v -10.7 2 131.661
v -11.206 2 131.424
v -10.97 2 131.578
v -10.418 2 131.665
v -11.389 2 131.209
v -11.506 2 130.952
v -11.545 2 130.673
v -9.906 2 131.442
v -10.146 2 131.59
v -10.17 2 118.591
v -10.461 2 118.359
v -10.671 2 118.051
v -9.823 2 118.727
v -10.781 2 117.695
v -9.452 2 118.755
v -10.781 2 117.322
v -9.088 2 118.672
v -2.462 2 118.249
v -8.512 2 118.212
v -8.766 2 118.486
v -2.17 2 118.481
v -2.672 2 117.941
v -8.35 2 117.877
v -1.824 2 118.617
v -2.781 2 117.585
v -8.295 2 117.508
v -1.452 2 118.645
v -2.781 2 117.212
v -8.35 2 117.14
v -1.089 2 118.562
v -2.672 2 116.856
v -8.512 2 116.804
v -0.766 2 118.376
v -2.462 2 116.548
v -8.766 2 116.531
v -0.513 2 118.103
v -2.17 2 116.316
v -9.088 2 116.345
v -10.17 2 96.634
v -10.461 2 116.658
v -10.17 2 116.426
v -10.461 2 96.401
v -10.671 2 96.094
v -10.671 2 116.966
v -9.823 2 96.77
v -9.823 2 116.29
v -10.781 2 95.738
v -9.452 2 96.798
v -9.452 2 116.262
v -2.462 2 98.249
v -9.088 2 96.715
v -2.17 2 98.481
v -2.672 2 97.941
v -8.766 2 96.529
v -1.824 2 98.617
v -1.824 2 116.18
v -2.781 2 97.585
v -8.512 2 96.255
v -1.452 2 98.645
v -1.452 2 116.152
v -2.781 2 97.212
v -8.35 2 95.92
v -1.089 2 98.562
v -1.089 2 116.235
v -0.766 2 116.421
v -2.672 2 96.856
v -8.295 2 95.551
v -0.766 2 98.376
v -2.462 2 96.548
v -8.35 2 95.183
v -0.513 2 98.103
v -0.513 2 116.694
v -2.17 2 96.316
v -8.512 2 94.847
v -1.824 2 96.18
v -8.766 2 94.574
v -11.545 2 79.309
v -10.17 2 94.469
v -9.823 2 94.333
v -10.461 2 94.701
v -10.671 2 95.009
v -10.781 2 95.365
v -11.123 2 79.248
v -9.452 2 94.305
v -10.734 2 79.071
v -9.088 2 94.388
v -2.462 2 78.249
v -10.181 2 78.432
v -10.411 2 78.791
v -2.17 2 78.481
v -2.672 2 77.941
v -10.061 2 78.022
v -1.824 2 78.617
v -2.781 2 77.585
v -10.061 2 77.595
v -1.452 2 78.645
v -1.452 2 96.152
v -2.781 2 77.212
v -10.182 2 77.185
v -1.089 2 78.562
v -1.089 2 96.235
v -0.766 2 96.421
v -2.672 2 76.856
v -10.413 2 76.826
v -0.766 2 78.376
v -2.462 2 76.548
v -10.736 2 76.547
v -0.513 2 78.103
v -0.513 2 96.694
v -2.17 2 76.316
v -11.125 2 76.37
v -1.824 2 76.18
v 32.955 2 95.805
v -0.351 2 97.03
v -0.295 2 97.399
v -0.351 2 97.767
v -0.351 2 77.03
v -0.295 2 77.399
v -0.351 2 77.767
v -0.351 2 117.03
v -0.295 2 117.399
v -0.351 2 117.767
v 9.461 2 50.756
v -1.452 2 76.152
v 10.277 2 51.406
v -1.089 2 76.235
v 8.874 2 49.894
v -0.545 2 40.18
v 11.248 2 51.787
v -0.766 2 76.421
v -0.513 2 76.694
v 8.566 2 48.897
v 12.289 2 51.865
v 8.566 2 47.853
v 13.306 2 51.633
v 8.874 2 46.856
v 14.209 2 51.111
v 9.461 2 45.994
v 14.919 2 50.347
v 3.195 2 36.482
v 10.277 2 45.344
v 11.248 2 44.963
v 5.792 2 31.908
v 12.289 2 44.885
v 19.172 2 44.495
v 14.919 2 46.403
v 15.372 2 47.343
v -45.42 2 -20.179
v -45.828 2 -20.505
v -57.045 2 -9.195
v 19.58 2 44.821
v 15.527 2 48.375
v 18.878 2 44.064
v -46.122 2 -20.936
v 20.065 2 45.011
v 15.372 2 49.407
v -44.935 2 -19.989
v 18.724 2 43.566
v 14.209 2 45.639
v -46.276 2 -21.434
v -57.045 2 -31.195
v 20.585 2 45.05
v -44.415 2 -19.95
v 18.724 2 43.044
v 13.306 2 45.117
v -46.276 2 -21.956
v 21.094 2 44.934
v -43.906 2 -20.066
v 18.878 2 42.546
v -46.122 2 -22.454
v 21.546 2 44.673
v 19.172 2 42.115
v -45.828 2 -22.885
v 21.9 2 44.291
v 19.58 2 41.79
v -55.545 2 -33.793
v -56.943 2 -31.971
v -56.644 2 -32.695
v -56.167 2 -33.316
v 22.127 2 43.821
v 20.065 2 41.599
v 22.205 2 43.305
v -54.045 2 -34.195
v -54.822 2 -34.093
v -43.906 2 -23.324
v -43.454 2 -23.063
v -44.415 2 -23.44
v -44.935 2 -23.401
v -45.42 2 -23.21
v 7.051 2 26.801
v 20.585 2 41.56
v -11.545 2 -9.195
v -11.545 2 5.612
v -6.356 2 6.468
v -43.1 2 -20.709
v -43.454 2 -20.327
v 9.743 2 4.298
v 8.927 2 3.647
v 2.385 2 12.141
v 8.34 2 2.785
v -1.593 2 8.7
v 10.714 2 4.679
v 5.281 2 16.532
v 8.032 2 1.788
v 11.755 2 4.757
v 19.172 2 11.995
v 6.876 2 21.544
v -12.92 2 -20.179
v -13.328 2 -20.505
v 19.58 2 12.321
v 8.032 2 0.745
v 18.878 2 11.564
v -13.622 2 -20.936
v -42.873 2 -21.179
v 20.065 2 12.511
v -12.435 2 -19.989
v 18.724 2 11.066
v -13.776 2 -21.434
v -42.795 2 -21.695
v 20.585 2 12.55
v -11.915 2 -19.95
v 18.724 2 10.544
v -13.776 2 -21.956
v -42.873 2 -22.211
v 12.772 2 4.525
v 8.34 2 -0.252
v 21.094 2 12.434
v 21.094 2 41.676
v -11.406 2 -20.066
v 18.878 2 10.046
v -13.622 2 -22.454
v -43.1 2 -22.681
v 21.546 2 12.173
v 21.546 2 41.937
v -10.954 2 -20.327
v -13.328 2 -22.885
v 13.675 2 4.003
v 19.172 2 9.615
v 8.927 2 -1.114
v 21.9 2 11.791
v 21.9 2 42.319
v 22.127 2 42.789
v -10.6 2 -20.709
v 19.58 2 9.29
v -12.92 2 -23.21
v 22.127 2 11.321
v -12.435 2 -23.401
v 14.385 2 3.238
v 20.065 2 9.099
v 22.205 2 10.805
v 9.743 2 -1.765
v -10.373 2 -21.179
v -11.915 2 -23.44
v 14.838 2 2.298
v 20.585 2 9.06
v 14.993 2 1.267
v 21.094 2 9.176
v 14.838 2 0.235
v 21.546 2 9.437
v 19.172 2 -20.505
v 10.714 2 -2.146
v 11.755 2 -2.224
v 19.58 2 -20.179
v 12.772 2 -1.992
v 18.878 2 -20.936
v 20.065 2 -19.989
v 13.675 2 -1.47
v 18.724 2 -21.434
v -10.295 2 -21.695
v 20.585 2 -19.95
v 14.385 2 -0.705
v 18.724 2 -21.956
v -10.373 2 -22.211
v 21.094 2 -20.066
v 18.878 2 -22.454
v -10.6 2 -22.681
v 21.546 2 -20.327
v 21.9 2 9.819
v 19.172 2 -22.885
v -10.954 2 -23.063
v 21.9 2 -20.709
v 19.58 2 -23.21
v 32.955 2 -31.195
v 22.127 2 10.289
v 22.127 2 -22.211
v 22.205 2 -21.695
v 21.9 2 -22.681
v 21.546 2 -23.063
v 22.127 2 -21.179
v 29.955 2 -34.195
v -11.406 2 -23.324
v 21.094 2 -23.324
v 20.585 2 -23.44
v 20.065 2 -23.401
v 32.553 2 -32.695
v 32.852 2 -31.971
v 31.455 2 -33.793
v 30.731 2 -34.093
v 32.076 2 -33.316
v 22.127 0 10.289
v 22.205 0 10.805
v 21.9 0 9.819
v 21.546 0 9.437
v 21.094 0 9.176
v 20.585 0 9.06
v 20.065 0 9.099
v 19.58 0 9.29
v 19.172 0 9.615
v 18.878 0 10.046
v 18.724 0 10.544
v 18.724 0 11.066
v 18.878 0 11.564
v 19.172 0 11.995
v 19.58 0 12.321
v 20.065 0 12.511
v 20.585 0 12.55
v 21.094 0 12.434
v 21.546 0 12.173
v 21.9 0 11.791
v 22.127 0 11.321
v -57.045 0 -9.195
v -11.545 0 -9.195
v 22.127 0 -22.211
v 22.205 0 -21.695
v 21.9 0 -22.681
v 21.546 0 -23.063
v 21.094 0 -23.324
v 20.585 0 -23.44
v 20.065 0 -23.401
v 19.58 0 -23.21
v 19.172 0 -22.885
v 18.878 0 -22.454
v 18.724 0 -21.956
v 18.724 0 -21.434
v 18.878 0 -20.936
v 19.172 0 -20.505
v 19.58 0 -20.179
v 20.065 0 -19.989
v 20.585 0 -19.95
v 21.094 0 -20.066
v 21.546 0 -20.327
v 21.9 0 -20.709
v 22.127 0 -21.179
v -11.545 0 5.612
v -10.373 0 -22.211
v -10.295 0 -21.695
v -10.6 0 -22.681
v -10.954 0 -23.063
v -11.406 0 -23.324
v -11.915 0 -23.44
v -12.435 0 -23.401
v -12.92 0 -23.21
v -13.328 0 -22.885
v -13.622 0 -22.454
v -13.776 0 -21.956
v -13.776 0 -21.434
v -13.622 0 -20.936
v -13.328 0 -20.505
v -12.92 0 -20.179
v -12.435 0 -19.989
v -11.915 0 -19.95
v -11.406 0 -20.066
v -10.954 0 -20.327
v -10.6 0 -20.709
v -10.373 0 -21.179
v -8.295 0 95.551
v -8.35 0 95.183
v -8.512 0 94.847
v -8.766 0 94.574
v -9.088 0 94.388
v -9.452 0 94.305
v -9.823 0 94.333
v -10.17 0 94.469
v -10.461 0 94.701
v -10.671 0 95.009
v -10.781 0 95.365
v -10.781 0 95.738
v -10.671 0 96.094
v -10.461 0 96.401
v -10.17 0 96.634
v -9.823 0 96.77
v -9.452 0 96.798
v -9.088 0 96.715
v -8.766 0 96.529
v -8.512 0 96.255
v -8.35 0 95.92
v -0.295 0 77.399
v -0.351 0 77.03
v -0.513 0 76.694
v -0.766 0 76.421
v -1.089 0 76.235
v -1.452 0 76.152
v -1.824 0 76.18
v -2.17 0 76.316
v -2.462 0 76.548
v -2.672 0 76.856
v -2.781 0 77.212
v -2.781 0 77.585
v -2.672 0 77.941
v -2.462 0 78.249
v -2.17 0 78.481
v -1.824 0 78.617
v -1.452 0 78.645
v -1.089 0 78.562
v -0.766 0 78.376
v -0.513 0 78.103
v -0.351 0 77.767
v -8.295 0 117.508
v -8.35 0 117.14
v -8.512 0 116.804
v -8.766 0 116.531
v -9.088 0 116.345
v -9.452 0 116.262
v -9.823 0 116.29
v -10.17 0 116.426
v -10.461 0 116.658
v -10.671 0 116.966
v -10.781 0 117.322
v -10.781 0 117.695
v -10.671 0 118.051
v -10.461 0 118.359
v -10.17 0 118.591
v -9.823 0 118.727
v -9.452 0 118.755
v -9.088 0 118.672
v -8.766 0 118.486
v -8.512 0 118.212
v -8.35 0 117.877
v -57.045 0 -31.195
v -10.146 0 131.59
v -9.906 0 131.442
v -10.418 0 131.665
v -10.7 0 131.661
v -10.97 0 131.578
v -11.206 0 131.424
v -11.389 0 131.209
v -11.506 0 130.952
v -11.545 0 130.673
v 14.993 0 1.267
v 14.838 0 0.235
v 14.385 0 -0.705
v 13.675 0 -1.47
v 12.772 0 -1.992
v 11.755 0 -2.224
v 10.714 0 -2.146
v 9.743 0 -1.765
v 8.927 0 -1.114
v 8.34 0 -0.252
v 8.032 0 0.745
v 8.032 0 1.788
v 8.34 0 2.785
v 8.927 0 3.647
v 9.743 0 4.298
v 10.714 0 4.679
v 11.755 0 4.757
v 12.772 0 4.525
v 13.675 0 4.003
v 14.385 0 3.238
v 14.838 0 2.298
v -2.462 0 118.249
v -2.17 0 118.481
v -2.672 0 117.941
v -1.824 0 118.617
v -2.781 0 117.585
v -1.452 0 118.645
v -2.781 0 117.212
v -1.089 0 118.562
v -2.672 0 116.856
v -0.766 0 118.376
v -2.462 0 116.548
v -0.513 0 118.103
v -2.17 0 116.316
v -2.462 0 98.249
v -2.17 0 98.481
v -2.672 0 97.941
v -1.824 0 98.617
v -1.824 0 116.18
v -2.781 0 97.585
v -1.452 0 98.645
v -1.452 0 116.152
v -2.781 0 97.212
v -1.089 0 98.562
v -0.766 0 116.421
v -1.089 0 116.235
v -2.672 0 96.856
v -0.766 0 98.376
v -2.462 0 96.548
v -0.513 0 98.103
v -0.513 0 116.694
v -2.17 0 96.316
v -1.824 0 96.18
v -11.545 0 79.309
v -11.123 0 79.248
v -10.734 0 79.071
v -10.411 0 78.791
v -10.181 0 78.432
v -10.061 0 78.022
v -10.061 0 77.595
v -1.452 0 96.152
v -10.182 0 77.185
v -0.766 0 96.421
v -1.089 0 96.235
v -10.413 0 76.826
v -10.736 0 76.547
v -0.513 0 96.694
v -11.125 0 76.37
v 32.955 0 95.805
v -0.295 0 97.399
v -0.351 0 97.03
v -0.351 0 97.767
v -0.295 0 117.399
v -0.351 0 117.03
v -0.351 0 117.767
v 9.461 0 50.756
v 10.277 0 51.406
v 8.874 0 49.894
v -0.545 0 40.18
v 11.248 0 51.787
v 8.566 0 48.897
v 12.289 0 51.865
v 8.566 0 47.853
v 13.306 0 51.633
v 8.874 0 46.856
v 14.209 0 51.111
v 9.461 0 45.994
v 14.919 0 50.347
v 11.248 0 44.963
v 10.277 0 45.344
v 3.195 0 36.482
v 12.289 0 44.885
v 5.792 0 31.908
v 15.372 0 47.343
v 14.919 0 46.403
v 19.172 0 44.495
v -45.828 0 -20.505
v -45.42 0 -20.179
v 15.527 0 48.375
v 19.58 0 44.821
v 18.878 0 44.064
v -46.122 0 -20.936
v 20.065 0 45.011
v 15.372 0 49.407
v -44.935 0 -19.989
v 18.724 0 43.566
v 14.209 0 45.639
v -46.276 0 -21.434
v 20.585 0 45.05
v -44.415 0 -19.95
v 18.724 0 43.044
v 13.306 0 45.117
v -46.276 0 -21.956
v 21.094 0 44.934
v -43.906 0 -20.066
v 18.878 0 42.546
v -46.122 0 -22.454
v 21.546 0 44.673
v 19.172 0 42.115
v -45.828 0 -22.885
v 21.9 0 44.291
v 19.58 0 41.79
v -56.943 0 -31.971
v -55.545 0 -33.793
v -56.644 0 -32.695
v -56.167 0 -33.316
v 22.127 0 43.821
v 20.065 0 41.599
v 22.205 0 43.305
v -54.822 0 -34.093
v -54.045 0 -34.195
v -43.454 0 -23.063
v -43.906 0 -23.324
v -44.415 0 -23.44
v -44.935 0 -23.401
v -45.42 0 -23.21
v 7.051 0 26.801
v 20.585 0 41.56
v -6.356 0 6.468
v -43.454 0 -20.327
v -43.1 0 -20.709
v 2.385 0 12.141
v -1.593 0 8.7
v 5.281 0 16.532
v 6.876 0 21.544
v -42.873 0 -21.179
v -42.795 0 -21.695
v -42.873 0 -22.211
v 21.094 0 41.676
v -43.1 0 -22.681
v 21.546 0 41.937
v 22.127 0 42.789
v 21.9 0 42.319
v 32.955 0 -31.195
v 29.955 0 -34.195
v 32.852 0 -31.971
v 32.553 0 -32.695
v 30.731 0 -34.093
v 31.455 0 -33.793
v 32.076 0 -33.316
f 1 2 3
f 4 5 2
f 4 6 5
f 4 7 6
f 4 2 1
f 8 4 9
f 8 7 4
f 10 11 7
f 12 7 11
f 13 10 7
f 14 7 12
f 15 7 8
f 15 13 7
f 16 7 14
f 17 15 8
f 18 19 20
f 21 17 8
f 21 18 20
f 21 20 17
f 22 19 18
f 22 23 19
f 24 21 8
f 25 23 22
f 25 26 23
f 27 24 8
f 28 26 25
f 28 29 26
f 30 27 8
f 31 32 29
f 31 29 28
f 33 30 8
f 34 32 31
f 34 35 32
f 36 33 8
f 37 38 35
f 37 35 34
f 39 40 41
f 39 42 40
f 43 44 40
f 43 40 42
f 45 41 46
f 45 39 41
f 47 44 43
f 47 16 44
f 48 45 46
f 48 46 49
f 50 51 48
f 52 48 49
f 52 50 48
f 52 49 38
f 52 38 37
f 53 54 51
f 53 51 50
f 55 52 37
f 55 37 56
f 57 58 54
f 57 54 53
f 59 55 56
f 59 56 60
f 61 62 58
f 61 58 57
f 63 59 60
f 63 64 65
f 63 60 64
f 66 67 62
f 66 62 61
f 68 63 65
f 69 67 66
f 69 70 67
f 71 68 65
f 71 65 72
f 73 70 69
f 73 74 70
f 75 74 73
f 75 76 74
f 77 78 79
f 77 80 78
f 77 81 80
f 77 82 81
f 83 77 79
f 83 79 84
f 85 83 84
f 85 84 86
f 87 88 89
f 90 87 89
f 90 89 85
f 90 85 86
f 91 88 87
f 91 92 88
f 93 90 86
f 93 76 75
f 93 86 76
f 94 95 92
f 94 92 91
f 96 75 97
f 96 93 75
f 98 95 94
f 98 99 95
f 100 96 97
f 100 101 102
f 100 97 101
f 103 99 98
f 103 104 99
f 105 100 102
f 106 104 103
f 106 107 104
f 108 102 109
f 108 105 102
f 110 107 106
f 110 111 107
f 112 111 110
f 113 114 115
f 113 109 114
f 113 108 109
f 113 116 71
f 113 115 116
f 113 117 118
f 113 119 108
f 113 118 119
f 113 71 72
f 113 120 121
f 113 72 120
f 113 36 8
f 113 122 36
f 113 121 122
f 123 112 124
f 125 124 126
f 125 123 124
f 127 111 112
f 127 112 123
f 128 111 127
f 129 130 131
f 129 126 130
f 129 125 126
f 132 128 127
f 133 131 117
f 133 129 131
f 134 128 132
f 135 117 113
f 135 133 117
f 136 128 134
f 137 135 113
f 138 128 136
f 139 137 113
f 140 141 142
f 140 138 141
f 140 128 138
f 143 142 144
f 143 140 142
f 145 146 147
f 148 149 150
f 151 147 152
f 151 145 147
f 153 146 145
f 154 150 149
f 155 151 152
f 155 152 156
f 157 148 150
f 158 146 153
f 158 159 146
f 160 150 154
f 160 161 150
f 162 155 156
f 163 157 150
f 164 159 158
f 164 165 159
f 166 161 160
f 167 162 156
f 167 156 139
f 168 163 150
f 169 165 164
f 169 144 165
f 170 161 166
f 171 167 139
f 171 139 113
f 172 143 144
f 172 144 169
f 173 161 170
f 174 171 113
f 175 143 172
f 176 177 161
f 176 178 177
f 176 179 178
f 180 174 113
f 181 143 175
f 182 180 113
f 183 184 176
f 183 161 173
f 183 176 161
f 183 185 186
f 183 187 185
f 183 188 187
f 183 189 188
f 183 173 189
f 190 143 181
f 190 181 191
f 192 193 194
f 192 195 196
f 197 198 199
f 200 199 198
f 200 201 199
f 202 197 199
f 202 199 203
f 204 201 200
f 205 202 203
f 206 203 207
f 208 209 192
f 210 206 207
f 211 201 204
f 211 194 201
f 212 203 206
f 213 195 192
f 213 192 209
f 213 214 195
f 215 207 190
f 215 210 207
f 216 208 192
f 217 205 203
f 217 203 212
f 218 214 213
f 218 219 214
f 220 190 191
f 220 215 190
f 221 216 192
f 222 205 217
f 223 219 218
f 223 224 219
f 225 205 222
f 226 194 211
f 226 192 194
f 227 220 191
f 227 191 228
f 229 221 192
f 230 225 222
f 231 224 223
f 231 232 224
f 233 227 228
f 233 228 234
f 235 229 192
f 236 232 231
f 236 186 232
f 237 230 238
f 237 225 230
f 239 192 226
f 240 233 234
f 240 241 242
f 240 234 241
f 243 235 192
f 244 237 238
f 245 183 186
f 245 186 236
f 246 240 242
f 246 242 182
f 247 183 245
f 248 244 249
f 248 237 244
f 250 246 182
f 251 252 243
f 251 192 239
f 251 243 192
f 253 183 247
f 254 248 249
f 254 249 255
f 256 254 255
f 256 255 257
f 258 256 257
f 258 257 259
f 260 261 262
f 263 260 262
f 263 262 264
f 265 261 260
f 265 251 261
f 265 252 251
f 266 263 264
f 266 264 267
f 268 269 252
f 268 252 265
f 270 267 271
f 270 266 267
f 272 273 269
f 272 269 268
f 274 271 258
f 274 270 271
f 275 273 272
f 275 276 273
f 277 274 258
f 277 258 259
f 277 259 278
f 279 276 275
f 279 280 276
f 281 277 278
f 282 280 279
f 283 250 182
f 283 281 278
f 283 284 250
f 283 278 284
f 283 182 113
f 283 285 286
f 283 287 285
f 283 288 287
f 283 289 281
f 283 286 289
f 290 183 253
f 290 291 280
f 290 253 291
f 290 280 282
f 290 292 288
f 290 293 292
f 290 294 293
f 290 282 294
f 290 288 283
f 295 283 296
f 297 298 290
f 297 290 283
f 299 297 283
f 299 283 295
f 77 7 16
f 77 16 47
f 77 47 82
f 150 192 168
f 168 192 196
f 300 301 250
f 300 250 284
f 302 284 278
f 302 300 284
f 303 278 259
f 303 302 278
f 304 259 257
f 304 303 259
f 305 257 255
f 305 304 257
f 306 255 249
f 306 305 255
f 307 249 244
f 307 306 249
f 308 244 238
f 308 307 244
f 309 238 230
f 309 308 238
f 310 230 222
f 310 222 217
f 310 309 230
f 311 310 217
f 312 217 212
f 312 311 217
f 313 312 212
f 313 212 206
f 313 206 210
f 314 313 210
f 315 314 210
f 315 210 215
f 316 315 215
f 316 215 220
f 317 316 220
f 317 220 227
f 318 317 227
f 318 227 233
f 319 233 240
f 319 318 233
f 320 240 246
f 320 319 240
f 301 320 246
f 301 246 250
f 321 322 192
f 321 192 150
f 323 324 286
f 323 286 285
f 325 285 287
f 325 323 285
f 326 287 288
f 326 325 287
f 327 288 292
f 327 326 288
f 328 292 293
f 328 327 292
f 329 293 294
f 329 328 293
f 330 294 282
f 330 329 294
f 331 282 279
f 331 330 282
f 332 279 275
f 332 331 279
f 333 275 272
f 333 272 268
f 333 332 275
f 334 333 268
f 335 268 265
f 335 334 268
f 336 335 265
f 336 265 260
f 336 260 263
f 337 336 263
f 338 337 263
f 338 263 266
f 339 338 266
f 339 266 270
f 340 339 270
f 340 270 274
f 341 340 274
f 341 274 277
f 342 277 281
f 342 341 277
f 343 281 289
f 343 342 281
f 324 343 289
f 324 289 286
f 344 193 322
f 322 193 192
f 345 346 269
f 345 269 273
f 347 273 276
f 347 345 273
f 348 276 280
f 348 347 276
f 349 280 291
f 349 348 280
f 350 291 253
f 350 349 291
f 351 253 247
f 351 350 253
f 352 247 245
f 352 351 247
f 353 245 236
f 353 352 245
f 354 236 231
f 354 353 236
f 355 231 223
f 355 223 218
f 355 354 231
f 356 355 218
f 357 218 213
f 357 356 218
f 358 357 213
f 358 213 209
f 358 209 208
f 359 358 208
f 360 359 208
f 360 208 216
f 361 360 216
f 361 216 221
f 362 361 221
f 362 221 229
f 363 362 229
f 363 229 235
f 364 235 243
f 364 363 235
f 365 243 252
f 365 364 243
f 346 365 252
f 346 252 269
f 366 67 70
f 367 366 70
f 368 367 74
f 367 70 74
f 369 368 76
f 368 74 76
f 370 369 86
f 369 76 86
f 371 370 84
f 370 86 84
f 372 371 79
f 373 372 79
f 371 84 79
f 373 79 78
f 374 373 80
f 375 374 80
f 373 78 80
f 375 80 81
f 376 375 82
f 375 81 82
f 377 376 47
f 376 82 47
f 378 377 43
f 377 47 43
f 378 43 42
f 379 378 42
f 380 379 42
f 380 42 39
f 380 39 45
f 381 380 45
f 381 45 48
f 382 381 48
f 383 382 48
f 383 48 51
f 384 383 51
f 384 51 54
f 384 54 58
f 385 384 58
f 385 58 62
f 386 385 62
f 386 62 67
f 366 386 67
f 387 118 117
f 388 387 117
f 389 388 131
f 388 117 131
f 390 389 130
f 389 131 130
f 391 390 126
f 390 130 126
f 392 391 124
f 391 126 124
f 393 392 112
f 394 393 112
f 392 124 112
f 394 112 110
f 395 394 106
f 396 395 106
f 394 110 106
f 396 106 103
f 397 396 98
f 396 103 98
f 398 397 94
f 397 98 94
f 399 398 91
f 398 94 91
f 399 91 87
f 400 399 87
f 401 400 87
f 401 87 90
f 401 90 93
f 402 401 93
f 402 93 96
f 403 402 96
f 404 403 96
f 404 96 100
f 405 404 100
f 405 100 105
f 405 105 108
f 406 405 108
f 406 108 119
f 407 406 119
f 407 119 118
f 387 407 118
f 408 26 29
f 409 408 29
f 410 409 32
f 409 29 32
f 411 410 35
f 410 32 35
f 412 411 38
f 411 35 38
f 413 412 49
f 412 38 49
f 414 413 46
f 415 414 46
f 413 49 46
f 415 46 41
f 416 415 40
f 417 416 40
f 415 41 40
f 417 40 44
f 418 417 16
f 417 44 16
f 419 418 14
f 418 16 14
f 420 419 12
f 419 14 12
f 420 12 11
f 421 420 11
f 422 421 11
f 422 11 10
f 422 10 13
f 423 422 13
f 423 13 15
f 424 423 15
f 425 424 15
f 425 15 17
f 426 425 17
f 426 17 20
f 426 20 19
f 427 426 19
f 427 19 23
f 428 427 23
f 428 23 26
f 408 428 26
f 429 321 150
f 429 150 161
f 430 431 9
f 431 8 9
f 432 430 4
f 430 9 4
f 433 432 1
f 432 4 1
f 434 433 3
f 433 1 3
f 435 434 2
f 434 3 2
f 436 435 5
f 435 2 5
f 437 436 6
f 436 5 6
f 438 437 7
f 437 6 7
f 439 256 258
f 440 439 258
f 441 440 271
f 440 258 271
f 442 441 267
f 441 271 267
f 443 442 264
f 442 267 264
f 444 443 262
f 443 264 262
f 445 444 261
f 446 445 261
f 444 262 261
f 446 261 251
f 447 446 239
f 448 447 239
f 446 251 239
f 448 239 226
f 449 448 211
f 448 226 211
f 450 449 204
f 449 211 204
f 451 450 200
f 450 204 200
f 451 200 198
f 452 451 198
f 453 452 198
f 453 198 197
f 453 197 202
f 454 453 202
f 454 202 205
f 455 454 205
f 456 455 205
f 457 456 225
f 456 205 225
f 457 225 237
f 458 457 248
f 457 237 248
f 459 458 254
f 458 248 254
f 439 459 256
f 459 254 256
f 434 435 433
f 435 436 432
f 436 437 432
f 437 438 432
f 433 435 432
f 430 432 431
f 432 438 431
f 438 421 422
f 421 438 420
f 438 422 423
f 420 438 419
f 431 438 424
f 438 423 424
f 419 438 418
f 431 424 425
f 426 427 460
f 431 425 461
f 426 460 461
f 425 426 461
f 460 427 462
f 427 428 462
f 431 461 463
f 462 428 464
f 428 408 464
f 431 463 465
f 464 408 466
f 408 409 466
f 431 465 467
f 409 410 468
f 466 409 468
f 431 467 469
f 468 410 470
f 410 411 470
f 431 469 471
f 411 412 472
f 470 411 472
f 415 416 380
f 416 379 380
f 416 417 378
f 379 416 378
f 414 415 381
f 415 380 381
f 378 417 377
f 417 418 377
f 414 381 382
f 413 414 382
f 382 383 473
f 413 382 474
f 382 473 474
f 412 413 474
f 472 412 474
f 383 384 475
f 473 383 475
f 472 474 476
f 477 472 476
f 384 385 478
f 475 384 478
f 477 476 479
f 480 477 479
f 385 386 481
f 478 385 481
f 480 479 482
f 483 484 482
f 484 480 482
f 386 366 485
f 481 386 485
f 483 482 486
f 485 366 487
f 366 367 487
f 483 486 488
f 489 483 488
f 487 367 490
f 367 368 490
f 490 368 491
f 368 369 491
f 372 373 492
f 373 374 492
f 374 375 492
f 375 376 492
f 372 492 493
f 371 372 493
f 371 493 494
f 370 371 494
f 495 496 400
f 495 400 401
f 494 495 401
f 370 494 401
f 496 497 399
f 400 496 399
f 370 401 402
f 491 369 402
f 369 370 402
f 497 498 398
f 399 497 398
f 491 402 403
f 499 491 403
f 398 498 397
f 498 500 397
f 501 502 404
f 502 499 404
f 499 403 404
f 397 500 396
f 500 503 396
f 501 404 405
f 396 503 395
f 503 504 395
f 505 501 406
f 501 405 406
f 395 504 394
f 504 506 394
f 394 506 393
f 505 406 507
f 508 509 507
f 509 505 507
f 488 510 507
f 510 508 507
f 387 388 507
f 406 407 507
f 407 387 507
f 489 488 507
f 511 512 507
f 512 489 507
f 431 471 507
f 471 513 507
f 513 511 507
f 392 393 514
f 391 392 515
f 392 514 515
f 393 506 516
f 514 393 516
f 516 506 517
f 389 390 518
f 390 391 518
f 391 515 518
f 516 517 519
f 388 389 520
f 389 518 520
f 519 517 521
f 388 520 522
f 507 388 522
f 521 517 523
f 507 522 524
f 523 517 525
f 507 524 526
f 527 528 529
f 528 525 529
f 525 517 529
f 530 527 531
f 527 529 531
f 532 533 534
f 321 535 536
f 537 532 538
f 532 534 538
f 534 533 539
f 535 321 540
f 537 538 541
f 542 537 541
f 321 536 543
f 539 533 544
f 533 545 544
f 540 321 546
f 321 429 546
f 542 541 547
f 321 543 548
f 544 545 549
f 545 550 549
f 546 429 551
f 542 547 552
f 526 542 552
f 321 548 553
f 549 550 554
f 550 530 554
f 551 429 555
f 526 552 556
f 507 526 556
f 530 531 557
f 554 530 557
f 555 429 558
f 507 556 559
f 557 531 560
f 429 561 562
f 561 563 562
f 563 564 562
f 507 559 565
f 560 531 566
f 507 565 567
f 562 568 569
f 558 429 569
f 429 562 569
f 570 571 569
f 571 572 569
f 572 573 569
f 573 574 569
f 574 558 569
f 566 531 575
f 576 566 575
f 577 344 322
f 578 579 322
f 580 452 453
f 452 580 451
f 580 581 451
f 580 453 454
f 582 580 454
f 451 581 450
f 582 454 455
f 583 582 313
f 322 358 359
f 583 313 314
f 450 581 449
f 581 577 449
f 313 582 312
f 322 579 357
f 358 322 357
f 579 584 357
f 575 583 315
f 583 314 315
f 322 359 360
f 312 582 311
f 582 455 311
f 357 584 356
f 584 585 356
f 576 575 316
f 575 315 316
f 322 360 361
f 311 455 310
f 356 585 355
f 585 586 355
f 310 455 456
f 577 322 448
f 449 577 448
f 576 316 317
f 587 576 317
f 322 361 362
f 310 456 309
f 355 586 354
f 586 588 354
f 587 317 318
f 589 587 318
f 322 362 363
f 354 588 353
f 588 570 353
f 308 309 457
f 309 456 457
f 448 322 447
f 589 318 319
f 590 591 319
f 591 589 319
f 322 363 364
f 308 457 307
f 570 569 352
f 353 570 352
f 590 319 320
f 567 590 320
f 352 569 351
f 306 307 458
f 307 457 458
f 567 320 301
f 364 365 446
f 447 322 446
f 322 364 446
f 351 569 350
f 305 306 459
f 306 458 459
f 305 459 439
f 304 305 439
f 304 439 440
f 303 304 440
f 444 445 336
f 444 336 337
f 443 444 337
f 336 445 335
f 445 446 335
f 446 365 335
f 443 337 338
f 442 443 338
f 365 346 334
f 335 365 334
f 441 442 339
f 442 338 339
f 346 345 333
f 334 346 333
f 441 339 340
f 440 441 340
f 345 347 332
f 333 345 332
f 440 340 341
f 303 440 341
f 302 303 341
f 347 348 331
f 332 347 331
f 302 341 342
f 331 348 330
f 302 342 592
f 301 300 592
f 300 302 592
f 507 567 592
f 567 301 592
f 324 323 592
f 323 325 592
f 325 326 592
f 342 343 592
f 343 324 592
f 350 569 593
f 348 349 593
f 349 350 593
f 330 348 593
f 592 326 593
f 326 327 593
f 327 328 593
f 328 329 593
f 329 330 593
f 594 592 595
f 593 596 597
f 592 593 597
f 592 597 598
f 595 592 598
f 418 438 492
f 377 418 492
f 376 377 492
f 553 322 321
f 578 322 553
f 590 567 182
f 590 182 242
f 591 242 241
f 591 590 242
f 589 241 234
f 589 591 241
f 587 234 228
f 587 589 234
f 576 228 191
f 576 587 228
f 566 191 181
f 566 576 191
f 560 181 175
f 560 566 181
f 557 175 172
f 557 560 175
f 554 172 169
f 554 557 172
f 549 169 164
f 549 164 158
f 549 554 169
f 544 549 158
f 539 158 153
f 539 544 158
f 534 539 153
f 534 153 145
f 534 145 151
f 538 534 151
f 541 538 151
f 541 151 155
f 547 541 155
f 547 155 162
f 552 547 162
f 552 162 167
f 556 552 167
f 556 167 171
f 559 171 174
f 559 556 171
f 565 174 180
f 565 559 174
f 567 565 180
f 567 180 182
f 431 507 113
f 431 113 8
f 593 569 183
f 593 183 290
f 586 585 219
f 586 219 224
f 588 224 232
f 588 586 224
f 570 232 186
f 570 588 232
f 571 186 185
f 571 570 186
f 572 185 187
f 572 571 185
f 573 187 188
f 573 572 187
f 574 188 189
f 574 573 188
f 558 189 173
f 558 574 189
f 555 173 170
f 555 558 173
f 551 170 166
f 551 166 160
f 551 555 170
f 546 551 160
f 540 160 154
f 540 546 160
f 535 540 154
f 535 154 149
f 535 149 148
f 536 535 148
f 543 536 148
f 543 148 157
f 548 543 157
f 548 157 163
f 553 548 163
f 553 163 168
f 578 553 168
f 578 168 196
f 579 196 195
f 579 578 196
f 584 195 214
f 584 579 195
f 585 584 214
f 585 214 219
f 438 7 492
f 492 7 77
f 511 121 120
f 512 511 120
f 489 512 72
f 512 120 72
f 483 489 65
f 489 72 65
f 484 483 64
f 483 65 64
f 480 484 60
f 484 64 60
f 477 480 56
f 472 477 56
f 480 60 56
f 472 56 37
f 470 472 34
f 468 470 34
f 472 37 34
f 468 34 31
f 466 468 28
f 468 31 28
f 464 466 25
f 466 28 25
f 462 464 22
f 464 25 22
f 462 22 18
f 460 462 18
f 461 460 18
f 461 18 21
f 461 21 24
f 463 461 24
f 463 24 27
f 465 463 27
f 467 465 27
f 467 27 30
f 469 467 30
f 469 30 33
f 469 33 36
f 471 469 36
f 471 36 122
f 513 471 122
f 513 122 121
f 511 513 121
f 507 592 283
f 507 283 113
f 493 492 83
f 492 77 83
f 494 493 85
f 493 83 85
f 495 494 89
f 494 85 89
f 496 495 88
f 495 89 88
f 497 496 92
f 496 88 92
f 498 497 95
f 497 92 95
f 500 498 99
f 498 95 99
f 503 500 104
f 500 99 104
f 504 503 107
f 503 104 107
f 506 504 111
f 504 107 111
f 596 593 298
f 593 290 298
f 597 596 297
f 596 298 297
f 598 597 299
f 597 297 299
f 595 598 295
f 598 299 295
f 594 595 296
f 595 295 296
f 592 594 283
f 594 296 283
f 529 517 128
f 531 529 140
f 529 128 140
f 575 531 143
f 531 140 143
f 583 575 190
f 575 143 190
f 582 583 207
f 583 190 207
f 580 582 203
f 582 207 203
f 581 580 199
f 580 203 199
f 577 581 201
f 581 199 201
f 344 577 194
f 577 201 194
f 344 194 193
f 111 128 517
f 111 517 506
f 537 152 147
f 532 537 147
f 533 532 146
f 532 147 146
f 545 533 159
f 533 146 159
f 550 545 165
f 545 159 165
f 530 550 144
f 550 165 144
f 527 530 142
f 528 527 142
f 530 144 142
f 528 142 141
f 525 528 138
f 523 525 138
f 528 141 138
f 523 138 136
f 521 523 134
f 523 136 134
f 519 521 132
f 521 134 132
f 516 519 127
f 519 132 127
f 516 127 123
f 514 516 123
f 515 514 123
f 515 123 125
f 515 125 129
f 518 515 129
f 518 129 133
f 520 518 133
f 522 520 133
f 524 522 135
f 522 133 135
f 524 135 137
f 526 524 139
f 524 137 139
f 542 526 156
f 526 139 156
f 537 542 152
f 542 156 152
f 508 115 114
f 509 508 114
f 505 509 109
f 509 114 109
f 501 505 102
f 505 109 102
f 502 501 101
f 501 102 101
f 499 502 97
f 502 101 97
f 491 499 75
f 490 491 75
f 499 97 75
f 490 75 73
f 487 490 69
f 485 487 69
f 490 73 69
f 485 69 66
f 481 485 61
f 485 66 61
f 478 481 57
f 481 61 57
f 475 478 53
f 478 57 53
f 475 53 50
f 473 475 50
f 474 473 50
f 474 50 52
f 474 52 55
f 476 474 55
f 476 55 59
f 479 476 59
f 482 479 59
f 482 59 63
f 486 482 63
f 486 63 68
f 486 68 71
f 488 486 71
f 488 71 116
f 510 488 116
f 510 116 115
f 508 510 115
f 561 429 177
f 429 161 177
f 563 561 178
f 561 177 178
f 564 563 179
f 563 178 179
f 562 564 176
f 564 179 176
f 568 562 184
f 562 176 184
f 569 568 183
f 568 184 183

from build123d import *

# Parameters (mm, degrees)
SKETCH_1_R               = 1.75
EXTRUDE_1_DEPTH          = 2
SKETCH_4_W               = 29
SKETCH_4_H               = 65
SKETCH_4_R               = 3.5
EXTRUDE_2_DEPTH          = 2
SKETCH_5_R               = 19.2
CUT_EXTRUDE_1_DEPTH      = 1
CUT_EXTRUDE_1_DEPTH_BACK = 3
CUT_EXTRUDE_2_DEPTH      = 1
CUT_EXTRUDE_2_DEPTH_BACK = 3
FILLET_1_R               = 3
SKETCH_9_R               = 1.5
CUT_EXTRUDE_4_DEPTH      = 1
CUT_EXTRUDE_4_DEPTH_BACK = 3
FILLET_2_R               = 1
SKETCH_13_R              = 1.25
CUT_EXTRUDE_6_DEPTH      = 1
CUT_EXTRUDE_6_DEPTH_BACK = 3
SKETCH_15_R              = 1.25
CUT_EXTRUDE_7_DEPTH      = 1
CUT_EXTRUDE_7_DEPTH_BACK = 3


with BuildPart() as part:
    # Эскиз1 → Бобышка-Вытянуть1 (new body)
    with BuildSketch(Plane(origin=(0, 0, 0), x_dir=(1, 0, 0), z_dir=(0, 1, 0))):
        Polygon((-57.045428332, 34.194915254), (32.954571668, 34.194915254), (32.954571668, -95.805084746), (-11.545428332, -132.805084746), (-11.545428332, -55.805084746), (17.454571668, -55.805084746), (17.454571668, 9.194915254), (-57.045428332, 9.194915254), align=None)
        with Locations((-44.545428332, 21.694915254)):
            Circle(SKETCH_1_R, mode=Mode.SUBTRACT)
        with Locations((-12.045428332, 21.694915254)):
            Circle(SKETCH_1_R, mode=Mode.SUBTRACT)
        with Locations((20.454571668, 21.694915254)):
            Circle(SKETCH_1_R, mode=Mode.SUBTRACT)
        with Locations((20.454571668, -10.805084746)):
            Circle(SKETCH_1_R, mode=Mode.SUBTRACT)
        with Locations((20.454571668, -43.305084746)):
            Circle(SKETCH_1_R, mode=Mode.SUBTRACT)
    extrude(amount=EXTRUDE_1_DEPTH)

    # Эскиз4 → Бобышка-Вытянуть2 (add)
    with BuildSketch(Plane(origin=(0, 2, 0), x_dir=(1, 0, 0), z_dir=(0, 1, 0))):
        with Locations((2.954571668, -23.305084746)):
            Rectangle(SKETCH_4_W, SKETCH_4_H)
        with Locations((12.027100485, -48.375084746)):
            Circle(SKETCH_4_R, mode=Mode.SUBTRACT)
        with Locations((11.493153901, -1.266502513)):
            Circle(SKETCH_4_R, mode=Mode.SUBTRACT)
    extrude(amount=-EXTRUDE_2_DEPTH)

    # Эскиз5 → Вырез-Вытянуть1 (cut, two sides)
    with BuildSketch(Plane(origin=(0, 2, 0), x_dir=(1, 0, 0), z_dir=(0, 1, 0))) as cut_extrude_1_sk:
        with Locations((-12.045428332, -24.805084746)):
            Circle(SKETCH_5_R)
    extrude(amount=CUT_EXTRUDE_1_DEPTH, mode=Mode.SUBTRACT)
    extrude(cut_extrude_1_sk.sketch, amount=-CUT_EXTRUDE_1_DEPTH_BACK, mode=Mode.SUBTRACT)

    # Эскиз7 → Вырез-Вытянуть2 (cut, two sides)
    with BuildSketch(Plane(origin=(0, 2, 0), x_dir=(1, 0, 0), z_dir=(0, 1, 0))) as cut_extrude_2_sk:
        with BuildLine():
            Line((-0.545428332, -40.180064421), (-11.545428332, -77.80926144))
            Line((-11.545428332, -77.80926144), (-11.545428332, -43.998573225))
            ThreePointArc((-11.545428332, -43.998573225), (-5.751853603, -42.935021213), (-0.545428332, -40.180064421))
        make_face()
    extrude(amount=CUT_EXTRUDE_2_DEPTH, mode=Mode.SUBTRACT)
    extrude(cut_extrude_2_sk.sketch, amount=-CUT_EXTRUDE_2_DEPTH_BACK, mode=Mode.SUBTRACT)

    # Скругление1
    fillet_1_edges = [part.edges().sort_by_distance(p)[0] for p in [
        (-57.045428332, 1, -34.194915254),
        (32.954571668, 1, -34.194915254),
    ]]
    fillet(fillet_1_edges, radius=FILLET_1_R)

    # Эскиз9 → Вырез-Вытянуть4 (cut, two sides)
    with BuildSketch(Plane(origin=(0, 2, 0), x_dir=(1, 0, 0), z_dir=(0, 1, 0))) as cut_extrude_4_sk:
        with Locations((-11.545428332, -77.80926144)):
            Circle(SKETCH_9_R)
    extrude(amount=CUT_EXTRUDE_4_DEPTH, mode=Mode.SUBTRACT)
    extrude(cut_extrude_4_sk.sketch, amount=-CUT_EXTRUDE_4_DEPTH_BACK, mode=Mode.SUBTRACT)

    # Скругление2
    fillet_2_edges = [part.edges().sort_by_distance(p)[0] for p in [
        (-11.545428332, 1, 132.805084746),
    ]]
    fillet(fillet_2_edges, radius=FILLET_2_R)

    # Эскиз13 → Вырез-Вытянуть6 (cut, two sides)
    with BuildSketch(Plane(origin=(0, 2, 0), x_dir=(1, 0, 0), z_dir=(0, 1, 0))) as cut_extrude_6_sk:
        with Locations((-9.54492596, -95.551225642)):
            Circle(SKETCH_13_R)
        with Locations((-9.54492596, -117.508337259)):
            Circle(SKETCH_13_R)
    extrude(amount=CUT_EXTRUDE_6_DEPTH, mode=Mode.SUBTRACT)
    extrude(cut_extrude_6_sk.sketch, amount=-CUT_EXTRUDE_6_DEPTH_BACK, mode=Mode.SUBTRACT)

    # Эскиз15 → Вырез-Вытянуть7 (cut, two sides)
    with BuildSketch(Plane(origin=(0, 2, 0), x_dir=(1, 0, 0), z_dir=(0, 1, 0))) as cut_extrude_7_sk:
        with Locations((-1.545428332, -117.398618322)):
            Circle(SKETCH_15_R)
        with Locations((-1.545428332, -97.398618322)):
            Circle(SKETCH_15_R)
        with Locations((-1.545428332, -77.398618322)):
            Circle(SKETCH_15_R)
    extrude(amount=CUT_EXTRUDE_7_DEPTH, mode=Mode.SUBTRACT)
    extrude(cut_extrude_7_sk.sketch, amount=-CUT_EXTRUDE_7_DEPTH_BACK, mode=Mode.SUBTRACT)


solid = part.part
